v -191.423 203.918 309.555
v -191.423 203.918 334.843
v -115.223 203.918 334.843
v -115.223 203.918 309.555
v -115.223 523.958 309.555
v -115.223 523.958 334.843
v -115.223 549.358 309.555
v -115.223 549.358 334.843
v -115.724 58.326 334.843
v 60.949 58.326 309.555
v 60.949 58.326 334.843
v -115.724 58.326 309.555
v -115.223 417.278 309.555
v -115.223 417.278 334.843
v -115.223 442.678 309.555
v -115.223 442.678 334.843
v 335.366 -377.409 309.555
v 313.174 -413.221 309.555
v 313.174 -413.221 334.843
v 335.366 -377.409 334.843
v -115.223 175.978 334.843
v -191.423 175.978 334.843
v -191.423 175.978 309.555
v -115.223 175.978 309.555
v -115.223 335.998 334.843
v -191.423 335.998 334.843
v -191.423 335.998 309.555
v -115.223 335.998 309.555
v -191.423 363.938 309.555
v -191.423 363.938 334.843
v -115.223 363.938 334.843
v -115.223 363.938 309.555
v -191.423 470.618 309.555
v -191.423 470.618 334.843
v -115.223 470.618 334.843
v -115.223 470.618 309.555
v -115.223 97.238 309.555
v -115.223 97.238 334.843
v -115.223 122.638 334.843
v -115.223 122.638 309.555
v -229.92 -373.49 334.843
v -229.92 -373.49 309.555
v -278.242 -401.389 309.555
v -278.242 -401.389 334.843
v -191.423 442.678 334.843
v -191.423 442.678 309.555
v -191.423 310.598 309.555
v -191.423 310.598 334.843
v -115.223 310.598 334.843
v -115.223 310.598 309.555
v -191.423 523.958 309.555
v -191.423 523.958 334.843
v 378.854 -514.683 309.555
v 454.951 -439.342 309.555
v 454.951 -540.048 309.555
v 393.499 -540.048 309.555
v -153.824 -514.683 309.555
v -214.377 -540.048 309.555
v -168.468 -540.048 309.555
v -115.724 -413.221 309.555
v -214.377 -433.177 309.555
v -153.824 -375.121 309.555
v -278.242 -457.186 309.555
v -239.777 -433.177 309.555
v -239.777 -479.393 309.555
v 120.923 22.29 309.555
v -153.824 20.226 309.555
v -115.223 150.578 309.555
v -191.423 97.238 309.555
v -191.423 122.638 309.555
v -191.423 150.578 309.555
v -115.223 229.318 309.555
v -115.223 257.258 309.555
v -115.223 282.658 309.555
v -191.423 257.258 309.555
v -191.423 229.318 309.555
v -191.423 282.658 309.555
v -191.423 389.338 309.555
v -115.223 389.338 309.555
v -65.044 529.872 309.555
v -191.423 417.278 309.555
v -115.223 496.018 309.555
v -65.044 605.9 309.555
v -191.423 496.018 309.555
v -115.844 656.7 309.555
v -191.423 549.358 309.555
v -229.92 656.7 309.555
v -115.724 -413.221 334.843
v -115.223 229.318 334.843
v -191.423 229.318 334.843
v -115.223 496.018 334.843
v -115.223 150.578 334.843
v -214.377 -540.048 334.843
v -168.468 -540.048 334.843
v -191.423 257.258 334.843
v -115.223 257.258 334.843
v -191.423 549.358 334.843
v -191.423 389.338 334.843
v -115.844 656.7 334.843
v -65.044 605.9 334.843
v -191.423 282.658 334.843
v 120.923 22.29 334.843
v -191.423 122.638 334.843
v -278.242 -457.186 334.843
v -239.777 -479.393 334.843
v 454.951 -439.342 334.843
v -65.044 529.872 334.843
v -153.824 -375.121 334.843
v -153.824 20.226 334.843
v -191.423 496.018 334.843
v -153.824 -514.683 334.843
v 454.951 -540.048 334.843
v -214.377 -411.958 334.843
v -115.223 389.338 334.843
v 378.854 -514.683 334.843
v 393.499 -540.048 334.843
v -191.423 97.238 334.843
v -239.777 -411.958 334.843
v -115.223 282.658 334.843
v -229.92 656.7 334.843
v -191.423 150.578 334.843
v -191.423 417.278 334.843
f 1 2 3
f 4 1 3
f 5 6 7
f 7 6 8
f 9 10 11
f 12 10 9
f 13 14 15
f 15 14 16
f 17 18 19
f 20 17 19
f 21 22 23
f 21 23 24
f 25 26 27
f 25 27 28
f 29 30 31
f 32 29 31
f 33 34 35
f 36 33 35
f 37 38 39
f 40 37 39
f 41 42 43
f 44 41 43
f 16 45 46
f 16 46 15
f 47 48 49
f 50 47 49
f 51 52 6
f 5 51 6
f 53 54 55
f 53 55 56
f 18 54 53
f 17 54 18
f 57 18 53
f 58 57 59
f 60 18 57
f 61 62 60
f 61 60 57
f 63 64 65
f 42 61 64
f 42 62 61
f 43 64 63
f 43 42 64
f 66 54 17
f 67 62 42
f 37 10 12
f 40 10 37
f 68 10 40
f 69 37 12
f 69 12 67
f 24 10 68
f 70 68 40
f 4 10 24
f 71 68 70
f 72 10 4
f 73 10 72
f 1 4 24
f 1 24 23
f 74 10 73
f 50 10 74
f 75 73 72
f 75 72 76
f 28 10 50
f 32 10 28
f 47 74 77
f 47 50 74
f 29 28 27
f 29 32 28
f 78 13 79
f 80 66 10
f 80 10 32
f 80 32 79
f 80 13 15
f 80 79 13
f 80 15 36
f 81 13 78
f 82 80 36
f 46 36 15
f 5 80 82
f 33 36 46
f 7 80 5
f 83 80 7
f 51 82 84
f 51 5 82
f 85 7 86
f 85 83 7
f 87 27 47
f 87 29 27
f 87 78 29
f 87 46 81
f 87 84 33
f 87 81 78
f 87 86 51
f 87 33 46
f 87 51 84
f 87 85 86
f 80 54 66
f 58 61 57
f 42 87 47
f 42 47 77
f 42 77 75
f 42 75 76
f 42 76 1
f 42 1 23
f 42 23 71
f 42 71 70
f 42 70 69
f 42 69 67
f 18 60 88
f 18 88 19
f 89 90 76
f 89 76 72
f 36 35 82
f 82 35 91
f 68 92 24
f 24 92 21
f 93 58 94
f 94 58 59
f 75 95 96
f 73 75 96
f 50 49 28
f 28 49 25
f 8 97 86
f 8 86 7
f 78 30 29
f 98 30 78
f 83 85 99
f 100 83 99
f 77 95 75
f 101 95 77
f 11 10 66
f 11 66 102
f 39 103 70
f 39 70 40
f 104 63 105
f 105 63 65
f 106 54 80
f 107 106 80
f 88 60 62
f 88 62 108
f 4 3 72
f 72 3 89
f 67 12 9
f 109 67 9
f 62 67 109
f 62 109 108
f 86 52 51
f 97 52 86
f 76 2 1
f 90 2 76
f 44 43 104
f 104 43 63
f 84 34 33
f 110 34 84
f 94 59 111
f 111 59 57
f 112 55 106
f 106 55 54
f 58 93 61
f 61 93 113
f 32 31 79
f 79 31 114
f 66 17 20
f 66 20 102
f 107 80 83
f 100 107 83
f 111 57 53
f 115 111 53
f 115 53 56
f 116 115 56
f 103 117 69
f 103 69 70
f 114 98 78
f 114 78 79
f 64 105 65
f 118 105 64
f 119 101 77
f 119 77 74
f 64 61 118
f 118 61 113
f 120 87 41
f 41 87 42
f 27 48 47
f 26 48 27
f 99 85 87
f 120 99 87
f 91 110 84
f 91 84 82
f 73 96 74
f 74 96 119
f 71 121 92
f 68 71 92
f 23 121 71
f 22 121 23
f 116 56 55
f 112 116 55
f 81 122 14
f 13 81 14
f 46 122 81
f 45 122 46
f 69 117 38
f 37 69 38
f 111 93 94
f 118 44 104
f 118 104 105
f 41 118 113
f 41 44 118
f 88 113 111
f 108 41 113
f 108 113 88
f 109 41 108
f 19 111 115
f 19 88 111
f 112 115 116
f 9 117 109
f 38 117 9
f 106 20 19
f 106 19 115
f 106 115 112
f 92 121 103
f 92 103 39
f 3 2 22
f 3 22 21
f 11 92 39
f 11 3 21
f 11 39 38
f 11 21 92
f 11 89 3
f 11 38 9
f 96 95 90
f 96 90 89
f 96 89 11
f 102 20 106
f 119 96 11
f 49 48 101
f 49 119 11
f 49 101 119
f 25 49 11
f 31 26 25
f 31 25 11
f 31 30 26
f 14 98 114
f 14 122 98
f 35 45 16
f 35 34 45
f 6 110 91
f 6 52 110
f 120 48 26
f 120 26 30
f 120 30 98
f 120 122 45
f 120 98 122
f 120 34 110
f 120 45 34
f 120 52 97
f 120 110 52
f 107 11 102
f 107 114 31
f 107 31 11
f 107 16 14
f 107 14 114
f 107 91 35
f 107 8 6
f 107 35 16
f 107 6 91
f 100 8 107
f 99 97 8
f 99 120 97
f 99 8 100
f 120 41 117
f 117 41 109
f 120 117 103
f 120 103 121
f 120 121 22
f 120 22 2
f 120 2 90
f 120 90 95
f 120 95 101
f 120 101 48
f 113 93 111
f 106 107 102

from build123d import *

# Parameters (mm, degrees)
BOSS_EXTRUDE1_DEPTH = 25.4
SCALE1_SCALE        = 25.365591398
SKETCH3_W           = 1042.369657432
SKETCH3_H           = 1273.252838884
CUT_EXTRUDE1_DEPTH  = 618.998
CHAMFER1_SIZE       = 50.8
CHAMFER2_SIZE       = 38.1
CHAMFER3_SIZE       = 40.64
CHAMFER3_SIZE2      = 40.894583593
CHAMFER4_SIZE       = 40.64
CHAMFER4_SIZE2      = 41.405123541
SKETCH4_W           = 25.4
SKETCH4_H           = 106.871356521
CUT_EXTRUDE2_DEPTH  = 618.998
SKETCH5_W           = 76.2
SKETCH5_H           = 25.4
CUT_EXTRUDE3_DEPTH  = 800.296261243
LPATTERN4_COUNT     = 2
LPATTERN4_PITCH     = 106.68
CUT_EXTRUDE4_DEPTH  = 25.4


with BuildPart() as part:
    # Sketch1 → Boss-Extrude1 (new body)
    with BuildSketch(Plane.XY):
        Polygon((-15.617276252, -25), (-13.194626522, -25), (-12.617276252, -24), (8.382723748, -24), (8.960074017, -25), (11.382723748, -25), (11.382723748, -21.02978992), (-9.117276252, 17.18), (-9.117276252, 22.18), (-15.617276252, 22.18), (-15.617276252, -18.433701616), (-17.522276252, -19.533553879), (-17.522276252, -21.733258405), (-15.617276252, -22.833110667), align=None)
        Polygon((-12.617276252, -20), (7.425731864, -20), (-2.548020957, -1.41), (-12.617276252, -1.41), align=None, mode=Mode.SUBTRACT)
    extrude(amount=BOSS_EXTRUDE1_DEPTH)


with BuildPart() as part_1:
    # Scale1: scaled about (-6.821956607, -3.861646577, 12.7)
    add(part.part.scale(SCALE1_SCALE).moved(Location((166.22100722, 94.091302618, -309.443010753))))

    # Sketch3 → Cut-Extrude1 (cut)
    with BuildSketch(Plane(origin=(0, 0, -309.443010753), x_dir=(-1, 0, 0), z_dir=(0, 0, -1))):
        with Locations((-113.67141854, 36.826872795)):
            Rectangle(SKETCH3_W, SKETCH3_H)
    extrude(amount=-CUT_EXTRUDE1_DEPTH, mode=Mode.SUBTRACT)

    # Chamfer1
    chamfer1_edges = [part_1.edges().sort_by_distance(p)[0] for p in [
        (-65.044096862, 656.700119822, 322.199),
    ]]
    chamfer(chamfer1_edges, length=CHAMFER1_SIZE)

    # Chamfer2
    chamfer2_edges = [part_1.edges().sort_by_distance(p)[0] for p in [
        (-153.823666755, -413.220525339, 322.199),
        (-153.823666755, 58.325818747, 322.199),
    ]]
    chamfer(chamfer2_edges, length=CHAMFER2_SIZE)

    # Chamfer3
    chamfer3_edges = [part_1.edges().sort_by_distance(p)[0] for p in [
        (101.588948743, 58.325818747, 322.199),
    ]]
    chamfer3_side = [part_1.faces().sort_by_distance(p)[0] for p in [
        (-7.067359006, 58.325818747, 322.199),
    ]]
    chamfer(chamfer3_edges, length=CHAMFER3_SIZE, length2=CHAMFER3_SIZE2, reference=chamfer3_side[0])

    # Chamfer4
    chamfer4_edges = [part_1.edges().sort_by_distance(p)[0] for p in [
        (354.579087503, -413.220525339, 322.199),
    ]]
    chamfer4_side = [part_1.faces().sort_by_distance(p)[0] for p in [
        (237.750829348, -195.465247251, 322.199),
    ]]
    chamfer(chamfer4_edges, length=CHAMFER4_SIZE, length2=CHAMFER4_SIZE2, reference=chamfer4_side[0])

    # Sketch4 → Cut-Extrude2 (cut)
    with BuildSketch(Plane.XY.offset(334.843010753)):
        with Locations((-227.077270504, -486.612804068)):
            Rectangle(SKETCH4_W, SKETCH4_H)
    extrude(amount=-CUT_EXTRUDE2_DEPTH, mode=Mode.SUBTRACT)

    # Sketch5 → Cut-Extrude3 (cut, through all)
    with BuildSketch(Plane.XY.offset(334.843010753)):
        with Locations((-153.322884144, 323.297517672)):
            Rectangle(SKETCH5_W, SKETCH5_H)
        with Locations((-153.322884144, 216.617517672)):
            Rectangle(SKETCH5_W, SKETCH5_H)
        with Locations((-153.322884144, 429.977517672)):
            Rectangle(SKETCH5_W, SKETCH5_H)
        with Locations((-153.322884144, 376.637517672)):
            Rectangle(SKETCH5_W, SKETCH5_H)
        with Locations((-153.322884144, 269.957517672)):
            Rectangle(SKETCH5_W, SKETCH5_H)
        with Locations((-153.322884144, 163.277517672)):
            Rectangle(SKETCH5_W, SKETCH5_H)
        with Locations((-153.322884144, 109.937517672)):
            Rectangle(SKETCH5_W, SKETCH5_H)
    cut_extrude3 = extrude(amount=-CUT_EXTRUDE3_DEPTH, mode=Mode.SUBTRACT)

    # LPattern4: Cut-Extrude3 ×2
    with Locations(*[(0, i * LPATTERN4_PITCH, 0) for i in range(1, LPATTERN4_COUNT)]):
        add(cut_extrude3, mode=Mode.SUBTRACT)

    # Sketch6 → Cut-Extrude4 (cut)
    with BuildSketch(Plane.ZY.offset(214.377270504)):
        Polygon((334.843010753, -433.177125807), (309.554989247, -433.177125807), (334.843010753, -411.957956289), align=None)
    extrude(amount=CUT_EXTRUDE4_DEPTH, mode=Mode.SUBTRACT)


solid = part_1.part
